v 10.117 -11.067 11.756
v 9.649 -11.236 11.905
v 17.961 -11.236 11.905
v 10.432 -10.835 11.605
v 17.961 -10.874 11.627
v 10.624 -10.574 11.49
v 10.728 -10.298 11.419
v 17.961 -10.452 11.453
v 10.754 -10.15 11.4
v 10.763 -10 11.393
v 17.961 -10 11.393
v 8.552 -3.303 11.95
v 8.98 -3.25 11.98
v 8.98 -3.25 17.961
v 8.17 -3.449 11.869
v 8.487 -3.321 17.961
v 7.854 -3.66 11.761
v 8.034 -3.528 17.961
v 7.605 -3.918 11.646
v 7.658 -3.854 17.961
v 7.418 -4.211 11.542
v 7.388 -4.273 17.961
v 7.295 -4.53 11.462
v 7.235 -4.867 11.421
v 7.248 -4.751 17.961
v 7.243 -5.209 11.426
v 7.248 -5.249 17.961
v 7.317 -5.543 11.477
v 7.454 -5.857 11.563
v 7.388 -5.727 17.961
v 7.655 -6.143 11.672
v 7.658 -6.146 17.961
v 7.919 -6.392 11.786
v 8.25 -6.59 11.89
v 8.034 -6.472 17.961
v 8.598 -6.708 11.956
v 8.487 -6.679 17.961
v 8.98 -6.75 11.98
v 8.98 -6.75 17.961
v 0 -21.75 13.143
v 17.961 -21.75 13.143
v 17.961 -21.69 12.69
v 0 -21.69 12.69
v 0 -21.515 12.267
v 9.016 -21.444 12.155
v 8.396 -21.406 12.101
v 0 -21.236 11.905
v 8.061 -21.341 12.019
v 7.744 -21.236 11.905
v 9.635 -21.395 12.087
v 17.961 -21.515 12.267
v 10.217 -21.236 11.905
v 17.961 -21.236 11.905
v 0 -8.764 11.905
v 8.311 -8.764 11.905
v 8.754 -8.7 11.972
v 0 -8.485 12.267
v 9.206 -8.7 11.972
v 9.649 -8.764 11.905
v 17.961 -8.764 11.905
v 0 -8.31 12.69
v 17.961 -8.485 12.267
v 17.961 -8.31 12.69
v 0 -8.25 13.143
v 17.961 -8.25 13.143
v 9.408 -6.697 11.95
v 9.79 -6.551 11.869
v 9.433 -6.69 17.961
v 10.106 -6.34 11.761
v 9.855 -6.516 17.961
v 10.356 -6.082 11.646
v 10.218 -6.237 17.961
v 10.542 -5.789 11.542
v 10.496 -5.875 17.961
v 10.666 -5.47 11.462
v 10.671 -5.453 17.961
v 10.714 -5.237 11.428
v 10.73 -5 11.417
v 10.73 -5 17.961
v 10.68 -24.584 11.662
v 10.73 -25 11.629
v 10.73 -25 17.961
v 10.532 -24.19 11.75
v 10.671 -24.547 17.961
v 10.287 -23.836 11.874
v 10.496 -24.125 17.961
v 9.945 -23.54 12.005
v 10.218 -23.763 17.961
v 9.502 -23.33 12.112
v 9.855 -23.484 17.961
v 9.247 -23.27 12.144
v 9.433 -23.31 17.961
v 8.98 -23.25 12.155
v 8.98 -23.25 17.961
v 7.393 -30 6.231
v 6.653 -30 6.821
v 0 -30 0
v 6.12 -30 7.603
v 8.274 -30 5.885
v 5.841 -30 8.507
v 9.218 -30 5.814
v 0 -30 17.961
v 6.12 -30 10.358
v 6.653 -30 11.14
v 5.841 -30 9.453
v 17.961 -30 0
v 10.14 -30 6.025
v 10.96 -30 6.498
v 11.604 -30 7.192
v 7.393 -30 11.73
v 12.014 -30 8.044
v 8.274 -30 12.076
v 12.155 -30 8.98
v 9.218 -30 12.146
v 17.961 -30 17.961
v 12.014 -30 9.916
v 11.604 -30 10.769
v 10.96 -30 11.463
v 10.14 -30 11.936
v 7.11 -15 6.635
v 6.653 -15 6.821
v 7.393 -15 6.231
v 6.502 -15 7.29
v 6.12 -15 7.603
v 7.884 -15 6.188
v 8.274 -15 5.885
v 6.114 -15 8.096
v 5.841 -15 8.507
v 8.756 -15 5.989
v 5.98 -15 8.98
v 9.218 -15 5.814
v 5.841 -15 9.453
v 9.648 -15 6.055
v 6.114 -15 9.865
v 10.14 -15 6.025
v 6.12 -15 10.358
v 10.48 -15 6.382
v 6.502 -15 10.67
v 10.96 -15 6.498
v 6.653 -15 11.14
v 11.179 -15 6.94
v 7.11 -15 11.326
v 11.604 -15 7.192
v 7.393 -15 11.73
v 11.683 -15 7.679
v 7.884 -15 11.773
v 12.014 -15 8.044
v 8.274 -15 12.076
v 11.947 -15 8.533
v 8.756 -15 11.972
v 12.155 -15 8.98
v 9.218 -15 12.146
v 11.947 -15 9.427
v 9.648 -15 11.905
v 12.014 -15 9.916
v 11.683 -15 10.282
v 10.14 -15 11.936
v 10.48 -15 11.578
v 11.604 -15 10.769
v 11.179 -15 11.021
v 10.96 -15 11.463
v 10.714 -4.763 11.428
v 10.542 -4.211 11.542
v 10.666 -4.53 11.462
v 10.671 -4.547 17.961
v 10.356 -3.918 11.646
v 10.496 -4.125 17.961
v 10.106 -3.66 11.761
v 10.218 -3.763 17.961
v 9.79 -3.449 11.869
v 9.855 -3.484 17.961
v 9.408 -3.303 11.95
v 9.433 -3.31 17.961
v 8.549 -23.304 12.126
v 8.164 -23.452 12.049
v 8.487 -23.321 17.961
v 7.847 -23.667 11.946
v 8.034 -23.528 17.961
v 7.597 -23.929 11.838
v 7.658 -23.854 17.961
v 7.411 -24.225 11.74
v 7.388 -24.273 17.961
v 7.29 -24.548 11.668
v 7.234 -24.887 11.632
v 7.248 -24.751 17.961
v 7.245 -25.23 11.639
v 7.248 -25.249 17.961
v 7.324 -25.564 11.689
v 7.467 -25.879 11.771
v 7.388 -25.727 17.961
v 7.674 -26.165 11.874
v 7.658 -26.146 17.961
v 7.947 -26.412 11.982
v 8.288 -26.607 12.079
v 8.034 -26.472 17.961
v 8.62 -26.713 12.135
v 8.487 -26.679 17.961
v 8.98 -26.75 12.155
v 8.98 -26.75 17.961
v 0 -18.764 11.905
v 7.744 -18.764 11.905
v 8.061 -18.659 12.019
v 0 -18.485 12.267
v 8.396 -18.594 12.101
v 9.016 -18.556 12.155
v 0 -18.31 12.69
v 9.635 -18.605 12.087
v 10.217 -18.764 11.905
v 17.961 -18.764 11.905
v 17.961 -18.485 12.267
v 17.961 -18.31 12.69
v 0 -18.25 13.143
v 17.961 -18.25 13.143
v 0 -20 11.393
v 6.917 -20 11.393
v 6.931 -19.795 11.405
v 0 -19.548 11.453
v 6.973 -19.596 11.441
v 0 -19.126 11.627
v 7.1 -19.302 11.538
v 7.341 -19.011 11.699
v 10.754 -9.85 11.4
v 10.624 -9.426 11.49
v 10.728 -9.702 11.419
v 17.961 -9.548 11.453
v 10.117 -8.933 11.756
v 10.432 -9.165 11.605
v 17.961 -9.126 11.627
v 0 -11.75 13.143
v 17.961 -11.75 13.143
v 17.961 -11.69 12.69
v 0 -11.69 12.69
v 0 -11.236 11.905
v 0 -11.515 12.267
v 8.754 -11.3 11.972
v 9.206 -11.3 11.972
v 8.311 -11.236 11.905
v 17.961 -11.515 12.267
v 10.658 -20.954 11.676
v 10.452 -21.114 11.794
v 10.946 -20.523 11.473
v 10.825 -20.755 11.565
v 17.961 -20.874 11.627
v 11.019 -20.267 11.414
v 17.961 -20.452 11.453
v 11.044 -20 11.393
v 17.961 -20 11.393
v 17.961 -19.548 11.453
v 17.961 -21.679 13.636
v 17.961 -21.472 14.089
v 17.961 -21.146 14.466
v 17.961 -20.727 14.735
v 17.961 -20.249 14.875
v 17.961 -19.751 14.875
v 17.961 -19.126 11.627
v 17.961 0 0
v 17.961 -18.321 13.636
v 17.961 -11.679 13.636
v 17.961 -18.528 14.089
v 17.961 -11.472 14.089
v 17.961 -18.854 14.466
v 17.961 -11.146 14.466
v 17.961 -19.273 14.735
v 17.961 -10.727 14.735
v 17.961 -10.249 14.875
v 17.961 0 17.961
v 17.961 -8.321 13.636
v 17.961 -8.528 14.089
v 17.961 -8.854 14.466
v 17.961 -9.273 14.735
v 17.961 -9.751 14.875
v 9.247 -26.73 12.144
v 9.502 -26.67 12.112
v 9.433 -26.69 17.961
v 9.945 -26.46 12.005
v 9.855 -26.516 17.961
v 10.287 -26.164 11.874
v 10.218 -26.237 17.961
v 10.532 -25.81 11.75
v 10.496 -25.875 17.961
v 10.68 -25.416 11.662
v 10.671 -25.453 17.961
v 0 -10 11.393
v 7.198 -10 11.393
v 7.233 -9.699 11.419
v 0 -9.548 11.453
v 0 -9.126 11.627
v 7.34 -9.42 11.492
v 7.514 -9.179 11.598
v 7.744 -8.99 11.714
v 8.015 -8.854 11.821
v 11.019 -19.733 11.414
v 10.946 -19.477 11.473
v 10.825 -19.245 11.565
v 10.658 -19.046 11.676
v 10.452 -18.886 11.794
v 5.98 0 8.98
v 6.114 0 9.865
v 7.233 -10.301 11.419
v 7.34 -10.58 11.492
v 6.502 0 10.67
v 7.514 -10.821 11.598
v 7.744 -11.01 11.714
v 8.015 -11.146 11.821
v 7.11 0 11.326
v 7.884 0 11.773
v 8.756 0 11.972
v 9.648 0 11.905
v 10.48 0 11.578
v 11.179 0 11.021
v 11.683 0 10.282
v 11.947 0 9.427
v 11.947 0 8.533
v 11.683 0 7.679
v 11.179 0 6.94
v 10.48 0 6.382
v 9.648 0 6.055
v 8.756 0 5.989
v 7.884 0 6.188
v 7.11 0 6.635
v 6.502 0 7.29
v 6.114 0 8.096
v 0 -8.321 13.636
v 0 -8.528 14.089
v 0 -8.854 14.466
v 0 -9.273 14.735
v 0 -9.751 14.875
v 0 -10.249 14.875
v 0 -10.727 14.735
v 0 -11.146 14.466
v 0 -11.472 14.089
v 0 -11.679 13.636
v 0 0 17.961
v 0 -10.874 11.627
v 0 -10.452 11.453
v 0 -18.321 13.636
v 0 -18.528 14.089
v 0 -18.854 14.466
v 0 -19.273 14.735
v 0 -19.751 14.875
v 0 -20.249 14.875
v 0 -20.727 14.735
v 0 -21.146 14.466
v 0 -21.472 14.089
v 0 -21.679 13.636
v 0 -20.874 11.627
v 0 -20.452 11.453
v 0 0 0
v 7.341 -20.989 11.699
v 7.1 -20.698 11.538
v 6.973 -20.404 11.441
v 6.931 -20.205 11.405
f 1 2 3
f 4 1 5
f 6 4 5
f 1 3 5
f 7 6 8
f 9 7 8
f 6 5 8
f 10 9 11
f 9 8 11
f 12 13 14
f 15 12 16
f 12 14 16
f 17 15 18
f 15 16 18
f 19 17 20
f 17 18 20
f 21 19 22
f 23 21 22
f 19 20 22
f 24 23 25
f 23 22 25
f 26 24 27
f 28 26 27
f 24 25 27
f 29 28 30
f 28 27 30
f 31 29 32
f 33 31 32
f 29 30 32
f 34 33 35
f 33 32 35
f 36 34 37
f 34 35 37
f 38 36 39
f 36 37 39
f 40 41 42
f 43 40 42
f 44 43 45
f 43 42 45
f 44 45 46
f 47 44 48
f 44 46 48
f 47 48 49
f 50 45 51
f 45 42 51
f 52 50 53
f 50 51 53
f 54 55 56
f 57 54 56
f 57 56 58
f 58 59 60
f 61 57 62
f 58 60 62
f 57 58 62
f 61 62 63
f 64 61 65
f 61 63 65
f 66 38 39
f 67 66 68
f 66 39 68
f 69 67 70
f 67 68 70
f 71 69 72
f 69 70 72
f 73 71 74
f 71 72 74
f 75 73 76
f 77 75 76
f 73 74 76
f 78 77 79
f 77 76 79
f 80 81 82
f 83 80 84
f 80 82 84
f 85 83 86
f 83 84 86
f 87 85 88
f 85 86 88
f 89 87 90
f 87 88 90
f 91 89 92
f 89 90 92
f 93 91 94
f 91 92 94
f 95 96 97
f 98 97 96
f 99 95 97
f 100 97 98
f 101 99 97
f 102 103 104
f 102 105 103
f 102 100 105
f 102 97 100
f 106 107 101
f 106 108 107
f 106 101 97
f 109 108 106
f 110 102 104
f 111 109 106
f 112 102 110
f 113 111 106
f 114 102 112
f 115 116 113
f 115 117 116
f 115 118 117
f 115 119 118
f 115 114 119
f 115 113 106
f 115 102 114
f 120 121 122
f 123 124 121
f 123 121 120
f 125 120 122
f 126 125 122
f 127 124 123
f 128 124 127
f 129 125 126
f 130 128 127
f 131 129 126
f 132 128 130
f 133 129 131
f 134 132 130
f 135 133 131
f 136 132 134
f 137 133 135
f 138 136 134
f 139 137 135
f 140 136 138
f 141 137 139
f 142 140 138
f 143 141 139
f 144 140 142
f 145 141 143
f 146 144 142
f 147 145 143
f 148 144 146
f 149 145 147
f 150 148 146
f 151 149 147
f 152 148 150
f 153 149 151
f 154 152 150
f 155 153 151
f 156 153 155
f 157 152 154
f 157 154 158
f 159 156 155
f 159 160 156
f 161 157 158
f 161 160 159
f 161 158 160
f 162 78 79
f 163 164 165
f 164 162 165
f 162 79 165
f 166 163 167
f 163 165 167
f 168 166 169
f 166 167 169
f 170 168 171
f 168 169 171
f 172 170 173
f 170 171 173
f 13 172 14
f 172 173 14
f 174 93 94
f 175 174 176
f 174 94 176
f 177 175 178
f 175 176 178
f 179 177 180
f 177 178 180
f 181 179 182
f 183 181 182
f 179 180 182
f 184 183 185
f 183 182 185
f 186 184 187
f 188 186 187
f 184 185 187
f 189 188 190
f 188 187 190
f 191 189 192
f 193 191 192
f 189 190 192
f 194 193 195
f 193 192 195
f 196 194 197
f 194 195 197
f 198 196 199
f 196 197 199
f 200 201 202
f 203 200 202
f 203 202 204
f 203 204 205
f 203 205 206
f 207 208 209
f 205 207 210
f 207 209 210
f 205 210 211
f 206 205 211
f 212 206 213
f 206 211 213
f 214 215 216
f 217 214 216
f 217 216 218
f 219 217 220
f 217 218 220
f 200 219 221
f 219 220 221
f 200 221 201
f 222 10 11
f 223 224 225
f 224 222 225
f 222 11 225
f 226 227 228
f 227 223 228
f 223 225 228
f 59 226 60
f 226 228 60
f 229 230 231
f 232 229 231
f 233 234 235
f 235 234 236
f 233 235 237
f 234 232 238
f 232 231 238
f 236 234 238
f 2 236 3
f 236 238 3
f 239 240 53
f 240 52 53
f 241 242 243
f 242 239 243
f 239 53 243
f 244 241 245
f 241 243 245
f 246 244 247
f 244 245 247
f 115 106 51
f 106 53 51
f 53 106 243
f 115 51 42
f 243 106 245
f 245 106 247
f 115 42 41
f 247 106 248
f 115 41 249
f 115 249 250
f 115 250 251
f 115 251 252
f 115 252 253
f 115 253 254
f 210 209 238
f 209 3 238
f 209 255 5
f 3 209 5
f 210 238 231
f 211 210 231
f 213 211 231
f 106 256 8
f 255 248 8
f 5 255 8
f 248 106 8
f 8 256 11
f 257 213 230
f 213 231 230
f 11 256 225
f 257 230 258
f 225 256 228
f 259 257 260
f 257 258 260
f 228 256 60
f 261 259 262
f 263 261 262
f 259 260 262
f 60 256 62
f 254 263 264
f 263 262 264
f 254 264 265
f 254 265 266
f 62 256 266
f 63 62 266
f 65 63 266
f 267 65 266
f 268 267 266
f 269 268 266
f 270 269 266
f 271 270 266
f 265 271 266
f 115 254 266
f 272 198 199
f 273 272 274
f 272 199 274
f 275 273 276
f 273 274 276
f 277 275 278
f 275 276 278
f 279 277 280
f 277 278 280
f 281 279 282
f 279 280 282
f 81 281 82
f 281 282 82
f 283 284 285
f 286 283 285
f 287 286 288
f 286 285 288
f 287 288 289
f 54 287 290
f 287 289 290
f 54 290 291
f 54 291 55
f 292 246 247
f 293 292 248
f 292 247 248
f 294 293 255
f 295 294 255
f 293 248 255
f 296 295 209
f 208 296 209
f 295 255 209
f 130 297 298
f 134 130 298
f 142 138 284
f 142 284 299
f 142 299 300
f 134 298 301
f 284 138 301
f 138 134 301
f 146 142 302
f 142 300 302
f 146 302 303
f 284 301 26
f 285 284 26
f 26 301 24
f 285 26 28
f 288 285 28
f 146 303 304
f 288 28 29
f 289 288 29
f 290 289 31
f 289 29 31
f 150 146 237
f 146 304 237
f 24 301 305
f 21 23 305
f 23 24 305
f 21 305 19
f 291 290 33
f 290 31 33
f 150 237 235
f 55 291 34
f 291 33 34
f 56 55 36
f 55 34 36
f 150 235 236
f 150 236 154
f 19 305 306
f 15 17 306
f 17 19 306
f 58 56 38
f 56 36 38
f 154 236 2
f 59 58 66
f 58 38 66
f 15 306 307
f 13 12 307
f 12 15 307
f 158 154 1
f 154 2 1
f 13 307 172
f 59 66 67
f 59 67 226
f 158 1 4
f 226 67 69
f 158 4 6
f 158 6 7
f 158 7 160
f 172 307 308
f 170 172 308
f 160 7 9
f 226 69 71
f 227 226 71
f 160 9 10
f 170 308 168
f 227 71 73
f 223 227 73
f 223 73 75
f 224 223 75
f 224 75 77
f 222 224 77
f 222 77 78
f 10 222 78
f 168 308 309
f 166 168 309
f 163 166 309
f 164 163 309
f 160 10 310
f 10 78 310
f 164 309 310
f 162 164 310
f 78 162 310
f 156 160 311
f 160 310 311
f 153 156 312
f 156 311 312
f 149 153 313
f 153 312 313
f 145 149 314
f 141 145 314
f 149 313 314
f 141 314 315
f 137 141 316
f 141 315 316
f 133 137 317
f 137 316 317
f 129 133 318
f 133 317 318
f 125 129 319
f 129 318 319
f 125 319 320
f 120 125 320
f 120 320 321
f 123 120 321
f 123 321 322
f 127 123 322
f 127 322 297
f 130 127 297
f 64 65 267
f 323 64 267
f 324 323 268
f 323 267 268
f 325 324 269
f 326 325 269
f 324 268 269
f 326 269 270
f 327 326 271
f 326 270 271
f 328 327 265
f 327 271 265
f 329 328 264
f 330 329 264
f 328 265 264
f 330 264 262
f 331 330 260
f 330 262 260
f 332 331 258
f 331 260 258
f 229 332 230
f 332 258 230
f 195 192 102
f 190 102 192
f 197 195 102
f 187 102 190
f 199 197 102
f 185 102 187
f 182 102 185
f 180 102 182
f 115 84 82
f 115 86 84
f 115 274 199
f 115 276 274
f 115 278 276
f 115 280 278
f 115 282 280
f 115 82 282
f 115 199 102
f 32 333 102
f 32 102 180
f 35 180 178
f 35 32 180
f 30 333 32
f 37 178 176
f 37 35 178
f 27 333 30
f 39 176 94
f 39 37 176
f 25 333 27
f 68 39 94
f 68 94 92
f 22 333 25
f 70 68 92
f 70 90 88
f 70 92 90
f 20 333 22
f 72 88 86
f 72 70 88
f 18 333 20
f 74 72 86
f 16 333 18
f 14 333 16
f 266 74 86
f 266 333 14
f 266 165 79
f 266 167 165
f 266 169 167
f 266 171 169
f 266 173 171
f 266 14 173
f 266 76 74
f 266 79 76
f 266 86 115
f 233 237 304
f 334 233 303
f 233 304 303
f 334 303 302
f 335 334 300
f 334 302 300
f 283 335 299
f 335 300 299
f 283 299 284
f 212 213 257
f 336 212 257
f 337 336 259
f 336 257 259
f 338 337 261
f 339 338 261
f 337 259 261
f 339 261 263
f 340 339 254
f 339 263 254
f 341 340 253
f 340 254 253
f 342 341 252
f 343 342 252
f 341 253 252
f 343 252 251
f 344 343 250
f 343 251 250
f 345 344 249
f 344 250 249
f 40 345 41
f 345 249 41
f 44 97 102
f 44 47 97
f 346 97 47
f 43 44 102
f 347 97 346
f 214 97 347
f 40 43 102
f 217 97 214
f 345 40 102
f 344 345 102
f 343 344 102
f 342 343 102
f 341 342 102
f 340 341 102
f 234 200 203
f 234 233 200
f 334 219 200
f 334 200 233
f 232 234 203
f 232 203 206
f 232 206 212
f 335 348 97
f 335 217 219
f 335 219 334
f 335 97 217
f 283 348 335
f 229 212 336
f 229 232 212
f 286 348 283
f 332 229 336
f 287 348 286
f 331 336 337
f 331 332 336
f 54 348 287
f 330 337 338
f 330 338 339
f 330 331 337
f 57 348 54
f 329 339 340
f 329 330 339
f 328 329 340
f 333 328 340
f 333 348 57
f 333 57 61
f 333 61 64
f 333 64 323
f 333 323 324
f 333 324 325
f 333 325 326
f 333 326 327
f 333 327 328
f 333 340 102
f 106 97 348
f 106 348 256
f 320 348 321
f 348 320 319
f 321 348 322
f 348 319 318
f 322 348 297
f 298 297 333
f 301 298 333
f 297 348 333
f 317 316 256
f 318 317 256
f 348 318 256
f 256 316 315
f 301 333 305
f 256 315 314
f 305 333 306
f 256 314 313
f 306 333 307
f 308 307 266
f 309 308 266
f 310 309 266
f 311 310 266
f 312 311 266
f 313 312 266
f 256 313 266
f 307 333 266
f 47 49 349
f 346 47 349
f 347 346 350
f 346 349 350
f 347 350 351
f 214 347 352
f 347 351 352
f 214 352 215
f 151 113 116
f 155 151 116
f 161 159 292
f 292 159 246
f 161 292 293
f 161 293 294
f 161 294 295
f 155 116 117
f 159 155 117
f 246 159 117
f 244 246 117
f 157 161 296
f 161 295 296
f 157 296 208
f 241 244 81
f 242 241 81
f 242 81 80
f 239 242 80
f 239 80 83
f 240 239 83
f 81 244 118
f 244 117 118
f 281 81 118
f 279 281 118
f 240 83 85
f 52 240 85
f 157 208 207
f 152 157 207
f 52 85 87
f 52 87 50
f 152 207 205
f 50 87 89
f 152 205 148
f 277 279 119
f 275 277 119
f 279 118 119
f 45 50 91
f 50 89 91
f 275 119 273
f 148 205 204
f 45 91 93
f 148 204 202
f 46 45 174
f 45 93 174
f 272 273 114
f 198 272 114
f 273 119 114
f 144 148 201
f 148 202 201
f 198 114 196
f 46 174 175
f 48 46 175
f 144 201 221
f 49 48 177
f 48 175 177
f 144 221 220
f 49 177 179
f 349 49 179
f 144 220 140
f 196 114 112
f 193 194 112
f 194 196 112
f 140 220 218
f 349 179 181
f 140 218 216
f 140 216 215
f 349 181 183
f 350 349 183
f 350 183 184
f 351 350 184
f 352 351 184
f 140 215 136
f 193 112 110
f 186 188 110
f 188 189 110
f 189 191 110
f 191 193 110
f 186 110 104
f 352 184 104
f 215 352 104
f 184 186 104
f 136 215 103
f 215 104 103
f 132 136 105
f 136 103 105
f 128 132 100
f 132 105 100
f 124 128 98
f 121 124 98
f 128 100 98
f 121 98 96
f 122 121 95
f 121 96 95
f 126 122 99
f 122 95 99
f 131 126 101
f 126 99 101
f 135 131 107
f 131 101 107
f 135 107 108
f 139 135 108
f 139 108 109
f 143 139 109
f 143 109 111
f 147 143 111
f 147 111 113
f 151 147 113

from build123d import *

# Parameters (mm, degrees)
F0_W     = 17.9605122421
F0_H     = 17.9605122421
F1_DEPTH = 30
F2_R     = 3.175
F3_DEPTH = 15
F4_R     = 3
F5_DEPTH = 15
F7_DEPTH = 10.5811646208
F9_DEPTH = 51.3227693737


with BuildPart() as f1:
    # F0 (on Front) → F1 (new body)
    with BuildSketch(Plane.XZ):
        with Locations((8.9802561211, 8.9802561211)):
            Rectangle(F0_W, F0_H)
    extrude(amount=F1_DEPTH)

    # F2 (on face) → F3 (cut)
    with BuildSketch(Plane.XZ.offset(30)):
        with Locations((8.9802561211, 8.9802561211)):
            Circle(F2_R)
    extrude(amount=-F3_DEPTH, mode=Mode.SUBTRACT)

    # F4 (on face) → F5 (cut)
    with BuildSketch(Plane(origin=(0, 0, 0), x_dir=(-1, 0, 0), z_dir=(0, 1, 0))):
        with Locations((-8.9802561211, 8.9802561211)):
            Circle(F4_R)
    extrude(amount=-F5_DEPTH, mode=Mode.SUBTRACT)

    # F6 (on face) → F7 (cut)
    with BuildSketch(Plane.XY.offset(17.9605122421)):
        with BuildLine():
            ThreePointArc((8.9802561211, -23.25), (7.2302561211, -25), (8.9802561211, -26.75))
            Line((8.9802561211, -26.75), (8.9802561211, -23.25))
        make_face()
        with BuildLine():
            Line((8.9802561211, -23.25), (8.9802561211, -26.75))
            ThreePointArc((8.9802561211, -26.75), (10.2176929881, -26.2374368671), (10.7302561211, -25))
            ThreePointArc((10.7302561211, -25), (10.2176929881, -23.7625631329), (8.9802561211, -23.25))
        make_face()
        with BuildLine():
            ThreePointArc((8.9802561211, -3.25), (7.2302561211, -5), (8.9802561211, -6.75))
            Line((8.9802561211, -6.75), (8.9802561211, -3.25))
        make_face()
        with BuildLine():
            Line((8.9802561211, -3.25), (8.9802561211, -6.75))
            ThreePointArc((8.9802561211, -6.75), (10.2176929881, -6.2374368671), (10.7302561211, -5))
            ThreePointArc((10.7302561211, -5), (10.2176929881, -3.7625631329), (8.9802561211, -3.25))
        make_face()
    extrude(amount=-F7_DEPTH, mode=Mode.SUBTRACT)

    # F8 (on face) → F9 (cut)
    with BuildSketch(Plane.YZ.offset(17.9605122421)):
        with BuildLine():
            ThreePointArc((-21.2362894379, 11.9046728878), (-20, 12.1552561211), (-18.7637105621, 11.9046728878))
            ThreePointArc((-18.7637105621, 11.9046728878), (-18.38352134, 12.4728109393), (-18.25, 13.1432561211))
            Line((-18.25, 13.1432561211), (-21.75, 13.1432561211))
            ThreePointArc((-21.75, 13.1432561211), (-21.61647866, 12.4728109393), (-21.2362894379, 11.9046728878))
        make_face()
        with BuildLine():
            ThreePointArc((-20, 11.3932561211), (-19.3310533124, 11.5261567645), (-18.7637105621, 11.9046728878))
            ThreePointArc((-18.7637105621, 11.9046728878), (-20, 12.1552561211), (-21.2362894379, 11.9046728878))
            ThreePointArc((-21.2362894379, 11.9046728878), (-20.6689466876, 11.5261567645), (-20, 11.3932561211))
        make_face()
        with BuildLine():
            Line((-21.75, 13.1432561211), (-18.25, 13.1432561211))
            ThreePointArc((-18.25, 13.1432561211), (-20, 14.8932561211), (-21.75, 13.1432561211))
        make_face()
        with BuildLine():
            ThreePointArc((-10.0000000112, 11.3932561211), (-9.3310533175, 11.5261567623), (-8.7637105621, 11.9046728878))
            ThreePointArc((-8.7637105621, 11.9046728878), (-10, 12.1552561211), (-11.2362894379, 11.9046728878))
            ThreePointArc((-11.2362894379, 11.9046728878), (-10.6689466928, 11.5261567666), (-10.0000000112, 11.3932561211))
        make_face()
        with BuildLine():
            ThreePointArc((-11.2362894379, 11.9046728878), (-10, 12.1552561211), (-8.7637105621, 11.9046728878))
            ThreePointArc((-8.7637105621, 11.9046728878), (-8.38352134, 12.4728109393), (-8.25, 13.1432561211))
            Line((-8.25, 13.1432561211), (-11.75, 13.1432561211))
            ThreePointArc((-11.75, 13.1432561211), (-11.61647866, 12.4728109393), (-11.2362894379, 11.9046728878))
        make_face()
        with BuildLine():
            Line((-11.75, 13.1432561211), (-8.25, 13.1432561211))
            ThreePointArc((-8.25, 13.1432561211), (-10, 14.8932561211), (-11.75, 13.1432561211))
        make_face()
    extrude(amount=-F9_DEPTH, mode=Mode.SUBTRACT)


solid = f1.part
